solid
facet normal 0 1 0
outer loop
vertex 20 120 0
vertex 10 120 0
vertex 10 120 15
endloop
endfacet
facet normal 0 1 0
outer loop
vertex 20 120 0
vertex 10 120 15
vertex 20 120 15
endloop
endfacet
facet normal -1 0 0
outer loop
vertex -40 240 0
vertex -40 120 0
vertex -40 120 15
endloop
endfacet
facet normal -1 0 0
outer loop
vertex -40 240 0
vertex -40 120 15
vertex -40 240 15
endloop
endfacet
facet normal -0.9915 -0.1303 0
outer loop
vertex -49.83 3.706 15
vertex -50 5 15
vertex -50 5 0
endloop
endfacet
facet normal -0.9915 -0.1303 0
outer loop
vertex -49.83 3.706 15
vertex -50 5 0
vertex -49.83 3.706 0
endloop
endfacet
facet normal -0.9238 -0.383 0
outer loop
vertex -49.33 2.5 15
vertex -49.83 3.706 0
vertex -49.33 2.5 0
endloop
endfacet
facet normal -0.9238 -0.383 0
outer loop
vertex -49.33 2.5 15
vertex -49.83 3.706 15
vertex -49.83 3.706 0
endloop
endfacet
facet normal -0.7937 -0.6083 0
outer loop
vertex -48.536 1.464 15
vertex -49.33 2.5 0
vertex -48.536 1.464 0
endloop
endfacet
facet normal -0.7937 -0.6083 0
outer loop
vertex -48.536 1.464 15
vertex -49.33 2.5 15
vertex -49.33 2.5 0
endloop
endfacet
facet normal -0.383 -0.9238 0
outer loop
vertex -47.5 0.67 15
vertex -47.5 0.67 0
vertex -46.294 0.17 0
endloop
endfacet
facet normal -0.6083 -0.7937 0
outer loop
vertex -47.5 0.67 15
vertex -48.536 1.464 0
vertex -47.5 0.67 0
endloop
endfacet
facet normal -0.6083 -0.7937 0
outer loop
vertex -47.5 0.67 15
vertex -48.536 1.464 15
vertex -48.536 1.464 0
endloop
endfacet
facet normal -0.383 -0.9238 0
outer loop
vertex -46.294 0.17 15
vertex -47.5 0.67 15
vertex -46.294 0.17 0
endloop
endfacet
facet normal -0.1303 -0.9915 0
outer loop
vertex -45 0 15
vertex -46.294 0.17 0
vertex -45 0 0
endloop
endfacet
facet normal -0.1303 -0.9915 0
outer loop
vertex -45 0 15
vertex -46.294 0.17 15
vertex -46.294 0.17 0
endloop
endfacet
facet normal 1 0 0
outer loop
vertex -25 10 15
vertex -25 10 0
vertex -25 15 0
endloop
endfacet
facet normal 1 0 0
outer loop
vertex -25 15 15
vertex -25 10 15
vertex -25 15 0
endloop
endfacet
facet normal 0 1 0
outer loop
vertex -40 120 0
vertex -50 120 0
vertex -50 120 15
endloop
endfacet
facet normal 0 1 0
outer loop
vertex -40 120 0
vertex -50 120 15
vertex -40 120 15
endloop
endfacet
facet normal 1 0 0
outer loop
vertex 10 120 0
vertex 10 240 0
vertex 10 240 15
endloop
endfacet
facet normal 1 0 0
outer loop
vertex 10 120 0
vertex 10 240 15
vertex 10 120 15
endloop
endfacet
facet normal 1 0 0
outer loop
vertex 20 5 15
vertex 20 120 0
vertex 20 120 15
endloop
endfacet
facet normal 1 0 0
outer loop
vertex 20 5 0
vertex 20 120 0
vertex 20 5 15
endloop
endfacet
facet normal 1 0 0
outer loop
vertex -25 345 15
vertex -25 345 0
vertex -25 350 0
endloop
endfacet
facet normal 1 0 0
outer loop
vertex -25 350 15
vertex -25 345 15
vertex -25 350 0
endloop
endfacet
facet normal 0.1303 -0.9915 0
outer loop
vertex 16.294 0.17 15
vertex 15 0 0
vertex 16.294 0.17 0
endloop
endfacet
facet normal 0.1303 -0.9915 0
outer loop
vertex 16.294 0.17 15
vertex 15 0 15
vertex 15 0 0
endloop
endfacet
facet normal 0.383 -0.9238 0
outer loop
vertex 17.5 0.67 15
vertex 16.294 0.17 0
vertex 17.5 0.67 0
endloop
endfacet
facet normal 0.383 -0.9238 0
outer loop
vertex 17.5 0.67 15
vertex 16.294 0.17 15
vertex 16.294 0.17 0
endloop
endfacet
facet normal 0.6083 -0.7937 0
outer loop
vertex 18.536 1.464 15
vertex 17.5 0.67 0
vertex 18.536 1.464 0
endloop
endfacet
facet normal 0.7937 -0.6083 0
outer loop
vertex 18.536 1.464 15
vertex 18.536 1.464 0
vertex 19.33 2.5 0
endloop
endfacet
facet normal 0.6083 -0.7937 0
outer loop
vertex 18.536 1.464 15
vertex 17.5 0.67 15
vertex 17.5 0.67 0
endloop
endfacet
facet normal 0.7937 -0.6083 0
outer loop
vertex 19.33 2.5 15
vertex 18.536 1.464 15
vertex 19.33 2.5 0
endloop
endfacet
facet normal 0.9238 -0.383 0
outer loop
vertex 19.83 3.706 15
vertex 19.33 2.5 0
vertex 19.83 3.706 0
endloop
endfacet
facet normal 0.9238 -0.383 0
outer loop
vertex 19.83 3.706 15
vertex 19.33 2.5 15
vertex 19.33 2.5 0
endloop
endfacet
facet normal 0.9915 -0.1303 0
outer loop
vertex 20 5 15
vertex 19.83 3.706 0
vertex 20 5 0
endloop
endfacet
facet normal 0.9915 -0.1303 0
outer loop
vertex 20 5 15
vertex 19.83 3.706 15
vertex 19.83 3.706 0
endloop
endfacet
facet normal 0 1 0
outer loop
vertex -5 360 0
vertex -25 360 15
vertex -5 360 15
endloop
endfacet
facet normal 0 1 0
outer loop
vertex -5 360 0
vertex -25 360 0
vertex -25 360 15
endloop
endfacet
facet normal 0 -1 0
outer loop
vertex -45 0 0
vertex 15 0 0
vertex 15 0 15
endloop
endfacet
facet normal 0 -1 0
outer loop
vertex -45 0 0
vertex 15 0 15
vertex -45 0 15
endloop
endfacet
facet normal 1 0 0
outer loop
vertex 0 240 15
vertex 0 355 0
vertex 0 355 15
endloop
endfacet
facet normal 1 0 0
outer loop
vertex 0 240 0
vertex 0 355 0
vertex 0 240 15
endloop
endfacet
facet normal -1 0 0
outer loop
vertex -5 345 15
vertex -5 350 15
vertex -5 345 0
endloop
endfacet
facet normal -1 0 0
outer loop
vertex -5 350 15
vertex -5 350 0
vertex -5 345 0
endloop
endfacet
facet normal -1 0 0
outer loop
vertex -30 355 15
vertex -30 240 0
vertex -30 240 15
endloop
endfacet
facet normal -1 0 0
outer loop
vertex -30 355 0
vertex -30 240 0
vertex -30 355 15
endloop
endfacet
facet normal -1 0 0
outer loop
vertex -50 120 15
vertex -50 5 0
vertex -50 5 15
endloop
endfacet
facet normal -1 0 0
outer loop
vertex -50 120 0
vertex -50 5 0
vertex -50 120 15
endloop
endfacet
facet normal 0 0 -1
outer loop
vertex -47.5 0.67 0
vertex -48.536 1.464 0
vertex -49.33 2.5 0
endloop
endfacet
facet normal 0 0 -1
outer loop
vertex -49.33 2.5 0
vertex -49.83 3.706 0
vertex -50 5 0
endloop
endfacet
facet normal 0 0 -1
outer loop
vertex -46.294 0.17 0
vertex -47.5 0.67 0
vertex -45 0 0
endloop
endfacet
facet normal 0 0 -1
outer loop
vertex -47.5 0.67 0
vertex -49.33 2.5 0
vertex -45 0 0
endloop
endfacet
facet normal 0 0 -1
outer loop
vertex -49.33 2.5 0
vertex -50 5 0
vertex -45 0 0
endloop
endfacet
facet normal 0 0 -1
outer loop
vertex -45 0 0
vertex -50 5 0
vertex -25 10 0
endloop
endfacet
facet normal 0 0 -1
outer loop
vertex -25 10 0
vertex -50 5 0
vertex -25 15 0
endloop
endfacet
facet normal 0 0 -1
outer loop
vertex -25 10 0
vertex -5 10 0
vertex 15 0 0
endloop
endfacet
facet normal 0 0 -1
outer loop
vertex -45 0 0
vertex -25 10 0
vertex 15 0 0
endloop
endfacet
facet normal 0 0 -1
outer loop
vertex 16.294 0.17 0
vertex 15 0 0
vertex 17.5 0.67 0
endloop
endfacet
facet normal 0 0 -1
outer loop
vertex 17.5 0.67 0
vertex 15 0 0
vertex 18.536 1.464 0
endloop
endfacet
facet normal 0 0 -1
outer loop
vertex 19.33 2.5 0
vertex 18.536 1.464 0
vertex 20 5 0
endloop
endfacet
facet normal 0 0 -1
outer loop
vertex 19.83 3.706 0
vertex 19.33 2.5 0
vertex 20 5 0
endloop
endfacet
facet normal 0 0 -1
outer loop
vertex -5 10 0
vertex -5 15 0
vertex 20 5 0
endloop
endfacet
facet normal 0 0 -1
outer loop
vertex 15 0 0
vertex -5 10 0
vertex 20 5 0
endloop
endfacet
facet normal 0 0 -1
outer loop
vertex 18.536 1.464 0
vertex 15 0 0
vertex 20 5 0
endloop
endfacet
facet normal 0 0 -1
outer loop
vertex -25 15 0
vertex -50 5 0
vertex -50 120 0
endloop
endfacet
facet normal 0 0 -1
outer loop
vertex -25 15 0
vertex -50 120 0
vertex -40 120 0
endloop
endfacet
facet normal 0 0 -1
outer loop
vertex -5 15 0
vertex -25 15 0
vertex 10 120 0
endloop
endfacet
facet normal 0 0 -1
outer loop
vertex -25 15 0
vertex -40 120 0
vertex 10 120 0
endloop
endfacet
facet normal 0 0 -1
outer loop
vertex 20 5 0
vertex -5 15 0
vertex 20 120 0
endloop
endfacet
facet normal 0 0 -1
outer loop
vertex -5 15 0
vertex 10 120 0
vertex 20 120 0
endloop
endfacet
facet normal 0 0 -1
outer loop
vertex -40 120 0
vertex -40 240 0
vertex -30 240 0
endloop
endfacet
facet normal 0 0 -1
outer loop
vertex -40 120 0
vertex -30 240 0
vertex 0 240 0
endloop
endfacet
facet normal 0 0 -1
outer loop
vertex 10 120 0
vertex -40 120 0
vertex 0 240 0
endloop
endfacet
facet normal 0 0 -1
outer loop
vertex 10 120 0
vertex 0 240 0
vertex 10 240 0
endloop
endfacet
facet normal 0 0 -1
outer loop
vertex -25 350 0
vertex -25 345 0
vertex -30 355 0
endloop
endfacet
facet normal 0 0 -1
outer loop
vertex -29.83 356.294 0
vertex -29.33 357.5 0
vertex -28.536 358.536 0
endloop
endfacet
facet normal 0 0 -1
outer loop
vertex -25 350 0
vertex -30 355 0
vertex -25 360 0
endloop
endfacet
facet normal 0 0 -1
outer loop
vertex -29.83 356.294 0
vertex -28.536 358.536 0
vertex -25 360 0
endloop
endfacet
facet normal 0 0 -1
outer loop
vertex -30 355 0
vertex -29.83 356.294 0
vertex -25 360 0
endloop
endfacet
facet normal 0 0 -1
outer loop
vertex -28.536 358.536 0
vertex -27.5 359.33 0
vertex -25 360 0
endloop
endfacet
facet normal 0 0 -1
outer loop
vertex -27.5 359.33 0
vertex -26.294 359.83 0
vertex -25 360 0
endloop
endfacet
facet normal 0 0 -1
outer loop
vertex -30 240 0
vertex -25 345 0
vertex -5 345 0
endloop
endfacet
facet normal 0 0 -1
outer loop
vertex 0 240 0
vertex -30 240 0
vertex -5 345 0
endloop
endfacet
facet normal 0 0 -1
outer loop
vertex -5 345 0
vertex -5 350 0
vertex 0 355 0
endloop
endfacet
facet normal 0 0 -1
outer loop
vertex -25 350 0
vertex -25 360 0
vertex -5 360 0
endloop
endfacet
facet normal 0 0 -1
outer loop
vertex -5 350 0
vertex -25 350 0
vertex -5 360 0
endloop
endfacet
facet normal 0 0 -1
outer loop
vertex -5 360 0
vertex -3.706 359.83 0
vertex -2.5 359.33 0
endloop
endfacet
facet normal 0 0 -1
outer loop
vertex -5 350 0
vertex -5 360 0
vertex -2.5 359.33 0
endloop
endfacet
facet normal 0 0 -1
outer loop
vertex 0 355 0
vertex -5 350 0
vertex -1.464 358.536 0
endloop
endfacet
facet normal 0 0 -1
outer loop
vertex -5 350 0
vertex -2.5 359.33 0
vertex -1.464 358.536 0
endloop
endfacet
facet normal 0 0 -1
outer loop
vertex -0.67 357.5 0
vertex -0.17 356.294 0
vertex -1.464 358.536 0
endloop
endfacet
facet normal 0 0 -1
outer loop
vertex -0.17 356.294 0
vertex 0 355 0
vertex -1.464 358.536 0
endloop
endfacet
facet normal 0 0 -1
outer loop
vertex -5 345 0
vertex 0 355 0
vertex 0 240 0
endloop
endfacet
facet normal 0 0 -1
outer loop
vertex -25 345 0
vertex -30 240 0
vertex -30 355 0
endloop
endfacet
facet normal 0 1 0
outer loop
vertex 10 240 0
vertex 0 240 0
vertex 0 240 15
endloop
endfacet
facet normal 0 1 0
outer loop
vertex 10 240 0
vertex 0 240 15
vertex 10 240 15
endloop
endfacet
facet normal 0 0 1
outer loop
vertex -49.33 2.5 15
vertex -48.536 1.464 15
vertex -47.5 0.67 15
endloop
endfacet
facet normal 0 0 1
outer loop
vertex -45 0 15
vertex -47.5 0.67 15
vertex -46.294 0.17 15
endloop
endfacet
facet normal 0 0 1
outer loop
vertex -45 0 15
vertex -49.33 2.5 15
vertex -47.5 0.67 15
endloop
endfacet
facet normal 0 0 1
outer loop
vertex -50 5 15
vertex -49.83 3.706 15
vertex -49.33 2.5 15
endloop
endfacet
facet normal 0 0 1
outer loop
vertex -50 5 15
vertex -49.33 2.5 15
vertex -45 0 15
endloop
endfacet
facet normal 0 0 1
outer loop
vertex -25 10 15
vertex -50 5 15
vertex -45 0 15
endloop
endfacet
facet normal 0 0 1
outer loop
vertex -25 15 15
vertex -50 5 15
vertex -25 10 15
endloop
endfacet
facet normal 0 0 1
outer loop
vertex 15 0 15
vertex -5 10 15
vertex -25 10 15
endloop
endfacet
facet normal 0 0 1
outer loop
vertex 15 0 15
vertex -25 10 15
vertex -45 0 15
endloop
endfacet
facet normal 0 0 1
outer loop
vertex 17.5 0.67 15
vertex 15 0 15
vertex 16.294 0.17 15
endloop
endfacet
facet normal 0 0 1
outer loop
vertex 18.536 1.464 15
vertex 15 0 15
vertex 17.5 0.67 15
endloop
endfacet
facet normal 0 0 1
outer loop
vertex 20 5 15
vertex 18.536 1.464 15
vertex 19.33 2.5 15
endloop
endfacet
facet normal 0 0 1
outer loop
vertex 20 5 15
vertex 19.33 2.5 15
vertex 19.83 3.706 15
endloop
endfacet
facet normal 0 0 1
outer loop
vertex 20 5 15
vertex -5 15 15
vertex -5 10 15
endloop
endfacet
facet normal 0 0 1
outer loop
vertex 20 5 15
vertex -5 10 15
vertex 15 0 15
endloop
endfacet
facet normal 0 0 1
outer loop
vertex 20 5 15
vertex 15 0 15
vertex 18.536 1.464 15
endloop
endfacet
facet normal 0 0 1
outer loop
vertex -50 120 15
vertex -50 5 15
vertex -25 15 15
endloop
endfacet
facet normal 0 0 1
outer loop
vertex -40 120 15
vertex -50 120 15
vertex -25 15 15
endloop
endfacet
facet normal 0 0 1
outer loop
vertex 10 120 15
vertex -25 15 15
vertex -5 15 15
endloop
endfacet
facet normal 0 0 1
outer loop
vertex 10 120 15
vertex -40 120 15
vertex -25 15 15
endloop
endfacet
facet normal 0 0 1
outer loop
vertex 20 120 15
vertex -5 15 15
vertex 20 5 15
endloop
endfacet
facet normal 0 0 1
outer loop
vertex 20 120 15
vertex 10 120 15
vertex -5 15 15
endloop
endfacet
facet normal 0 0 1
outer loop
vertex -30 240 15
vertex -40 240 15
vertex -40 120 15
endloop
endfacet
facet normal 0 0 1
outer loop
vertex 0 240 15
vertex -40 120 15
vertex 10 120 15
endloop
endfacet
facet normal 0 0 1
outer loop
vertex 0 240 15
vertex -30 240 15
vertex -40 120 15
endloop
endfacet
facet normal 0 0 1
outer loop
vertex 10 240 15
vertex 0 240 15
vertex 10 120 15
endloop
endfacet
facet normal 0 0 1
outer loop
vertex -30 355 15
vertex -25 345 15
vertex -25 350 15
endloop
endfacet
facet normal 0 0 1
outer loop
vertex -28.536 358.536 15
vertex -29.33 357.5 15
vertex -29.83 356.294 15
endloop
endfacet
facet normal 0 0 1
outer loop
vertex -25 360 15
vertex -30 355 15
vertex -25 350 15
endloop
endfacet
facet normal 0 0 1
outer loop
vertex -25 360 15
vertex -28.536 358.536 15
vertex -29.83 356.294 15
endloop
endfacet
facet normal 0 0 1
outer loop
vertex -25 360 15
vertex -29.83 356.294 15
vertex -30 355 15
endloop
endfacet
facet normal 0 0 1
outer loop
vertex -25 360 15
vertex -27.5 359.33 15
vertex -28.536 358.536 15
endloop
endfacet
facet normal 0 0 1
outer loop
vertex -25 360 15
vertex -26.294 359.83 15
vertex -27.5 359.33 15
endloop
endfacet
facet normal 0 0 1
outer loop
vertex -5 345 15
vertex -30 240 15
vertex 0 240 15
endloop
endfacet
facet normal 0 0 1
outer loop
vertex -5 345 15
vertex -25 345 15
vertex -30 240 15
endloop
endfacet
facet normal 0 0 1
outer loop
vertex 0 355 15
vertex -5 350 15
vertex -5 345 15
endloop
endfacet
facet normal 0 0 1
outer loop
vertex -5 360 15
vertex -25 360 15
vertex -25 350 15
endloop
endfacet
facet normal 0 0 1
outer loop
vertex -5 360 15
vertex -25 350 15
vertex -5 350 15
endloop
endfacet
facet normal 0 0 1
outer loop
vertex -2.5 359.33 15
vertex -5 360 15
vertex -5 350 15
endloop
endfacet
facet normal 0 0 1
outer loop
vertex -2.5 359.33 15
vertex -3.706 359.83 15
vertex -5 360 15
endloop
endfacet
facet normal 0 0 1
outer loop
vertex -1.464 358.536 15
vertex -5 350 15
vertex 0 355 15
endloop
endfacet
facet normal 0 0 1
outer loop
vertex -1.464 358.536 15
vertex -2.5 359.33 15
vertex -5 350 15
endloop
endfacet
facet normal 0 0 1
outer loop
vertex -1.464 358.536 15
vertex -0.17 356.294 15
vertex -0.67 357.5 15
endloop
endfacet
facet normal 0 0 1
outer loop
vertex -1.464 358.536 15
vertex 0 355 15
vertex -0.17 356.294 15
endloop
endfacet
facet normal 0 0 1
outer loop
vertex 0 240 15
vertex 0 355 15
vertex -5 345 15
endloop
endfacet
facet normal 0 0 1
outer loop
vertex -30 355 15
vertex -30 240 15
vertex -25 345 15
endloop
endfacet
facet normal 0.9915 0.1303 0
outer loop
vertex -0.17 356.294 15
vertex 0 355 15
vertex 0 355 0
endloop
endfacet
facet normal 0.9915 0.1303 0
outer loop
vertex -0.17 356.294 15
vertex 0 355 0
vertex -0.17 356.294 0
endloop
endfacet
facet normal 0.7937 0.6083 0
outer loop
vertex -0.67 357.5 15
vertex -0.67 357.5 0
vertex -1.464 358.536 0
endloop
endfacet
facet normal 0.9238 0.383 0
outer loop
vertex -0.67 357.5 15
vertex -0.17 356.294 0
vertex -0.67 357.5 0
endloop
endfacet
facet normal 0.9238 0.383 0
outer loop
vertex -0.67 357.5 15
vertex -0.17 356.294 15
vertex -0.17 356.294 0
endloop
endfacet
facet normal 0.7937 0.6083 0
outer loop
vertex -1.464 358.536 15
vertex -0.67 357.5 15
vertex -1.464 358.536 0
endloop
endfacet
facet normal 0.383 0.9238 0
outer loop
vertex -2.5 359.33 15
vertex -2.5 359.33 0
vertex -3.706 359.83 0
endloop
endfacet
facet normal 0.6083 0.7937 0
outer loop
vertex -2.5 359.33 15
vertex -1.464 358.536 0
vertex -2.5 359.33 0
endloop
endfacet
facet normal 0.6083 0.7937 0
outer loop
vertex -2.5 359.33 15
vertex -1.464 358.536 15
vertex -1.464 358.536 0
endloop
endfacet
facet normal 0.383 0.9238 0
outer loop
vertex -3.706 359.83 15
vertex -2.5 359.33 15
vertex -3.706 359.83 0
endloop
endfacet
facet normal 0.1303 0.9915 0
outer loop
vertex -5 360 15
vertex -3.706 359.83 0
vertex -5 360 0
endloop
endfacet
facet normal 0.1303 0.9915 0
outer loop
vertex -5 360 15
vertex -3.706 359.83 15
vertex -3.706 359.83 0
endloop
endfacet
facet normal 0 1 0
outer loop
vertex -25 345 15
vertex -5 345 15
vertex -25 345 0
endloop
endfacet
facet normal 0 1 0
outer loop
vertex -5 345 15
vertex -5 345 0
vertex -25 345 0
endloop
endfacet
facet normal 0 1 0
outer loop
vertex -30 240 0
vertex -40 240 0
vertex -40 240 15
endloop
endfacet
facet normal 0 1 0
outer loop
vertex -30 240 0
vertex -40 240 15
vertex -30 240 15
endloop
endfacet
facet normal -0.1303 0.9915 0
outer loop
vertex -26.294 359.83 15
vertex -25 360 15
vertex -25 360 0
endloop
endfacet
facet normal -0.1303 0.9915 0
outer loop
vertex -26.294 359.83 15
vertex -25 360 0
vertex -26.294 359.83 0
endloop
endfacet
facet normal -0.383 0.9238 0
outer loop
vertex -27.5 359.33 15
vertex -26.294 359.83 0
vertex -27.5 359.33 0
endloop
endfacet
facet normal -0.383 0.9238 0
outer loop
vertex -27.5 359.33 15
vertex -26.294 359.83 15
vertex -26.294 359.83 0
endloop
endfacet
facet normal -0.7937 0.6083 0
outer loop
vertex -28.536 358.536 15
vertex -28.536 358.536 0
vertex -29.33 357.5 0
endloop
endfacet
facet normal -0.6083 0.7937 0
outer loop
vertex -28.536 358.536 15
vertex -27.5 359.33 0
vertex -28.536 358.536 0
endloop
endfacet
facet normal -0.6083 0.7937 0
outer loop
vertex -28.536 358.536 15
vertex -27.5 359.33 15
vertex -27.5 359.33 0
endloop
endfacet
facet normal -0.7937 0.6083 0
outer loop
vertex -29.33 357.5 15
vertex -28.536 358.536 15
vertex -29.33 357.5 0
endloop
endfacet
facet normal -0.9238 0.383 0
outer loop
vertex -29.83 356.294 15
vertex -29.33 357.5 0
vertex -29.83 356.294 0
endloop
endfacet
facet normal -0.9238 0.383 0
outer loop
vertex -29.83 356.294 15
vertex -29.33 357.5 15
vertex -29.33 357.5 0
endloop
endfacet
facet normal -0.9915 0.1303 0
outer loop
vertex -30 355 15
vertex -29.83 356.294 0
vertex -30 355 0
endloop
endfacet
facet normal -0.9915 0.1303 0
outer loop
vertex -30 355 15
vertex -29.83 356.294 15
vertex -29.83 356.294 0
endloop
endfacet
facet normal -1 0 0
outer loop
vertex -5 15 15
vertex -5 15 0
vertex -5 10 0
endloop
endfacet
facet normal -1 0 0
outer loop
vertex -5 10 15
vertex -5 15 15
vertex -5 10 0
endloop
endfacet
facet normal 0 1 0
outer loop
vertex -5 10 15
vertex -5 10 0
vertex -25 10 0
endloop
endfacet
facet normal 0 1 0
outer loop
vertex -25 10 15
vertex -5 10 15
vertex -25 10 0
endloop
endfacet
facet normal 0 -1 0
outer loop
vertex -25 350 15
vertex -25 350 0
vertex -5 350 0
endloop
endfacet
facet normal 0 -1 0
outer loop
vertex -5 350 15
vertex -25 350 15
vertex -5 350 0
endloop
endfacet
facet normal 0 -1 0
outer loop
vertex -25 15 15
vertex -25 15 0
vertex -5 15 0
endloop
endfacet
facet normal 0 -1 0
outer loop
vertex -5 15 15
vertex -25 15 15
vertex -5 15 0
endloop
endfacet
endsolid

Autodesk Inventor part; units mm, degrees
ref_plane "YZ Plane" through (0, 0, 0) normal (1, 0, 0) x (0, 1, 0)
ref_plane "XZ Plane" through (0, 0, 0) normal (0, 1, 0) x (-1, 0, 0)
ref_plane "XY Plane" through (0, 0, 0) normal (0, 0, 1) x (1, 0, 0)
sketch "Sketch1" plane through (0, 0, 0) normal (0, 0, 1) x (1, 0, 0)
  line L0 (0, 0) -> (-30, 0)
  line L1 (-30, 0) -> (-30, 360)
  line L2 (-30, 360) -> (0, 360)
  line L3 (0, 360) -> (0, 0)
  line L4 (-40, 240) -> (10, 240)
  line L5 (10, 240) -> (10, 0)
  line L6 (10, 0) -> (-40, 0)
  line L7 (-40, 0) -> (-40, 240)
  line L8 (-50, 120) -> (20, 120)
  line L9 (20, 120) -> (20, 0)
  line L10 (20, 0) -> (-50, 0)
  line L11 (-50, 0) -> (-50, 120)
  line L12 (-5, 10) -> (-25, 10)
  line L13 (-25, 10) -> (-25, 15)
  line L14 (-25, 15) -> (-5, 15)
  line L15 (-5, 15) -> (-5, 10)
  line L16 (-25, 350) -> (-5, 350)
  line L17 (-5, 350) -> (-5, 345)
  line L18 (-5, 345) -> (-25, 345)
  line L19 (-25, 345) -> (-25, 350)
  dimension "d0" = 30
  dimension "d1" = 360
  dimension "d2" = 50
  dimension "d3" = 70
  dimension "d4" = 20
  dimension "d5" = 5
  dimension "d6" = 5
extrude "Extrusion1" add sketch "Sketch1" along normal blind 15
fillet "Fillet1" radius 5 4 edges at (-50, 0, 7.5) (20, 0, 7.5) (-30, 360, 7.5) (0, 360, 7.5)
properties part number "TENSOR"
